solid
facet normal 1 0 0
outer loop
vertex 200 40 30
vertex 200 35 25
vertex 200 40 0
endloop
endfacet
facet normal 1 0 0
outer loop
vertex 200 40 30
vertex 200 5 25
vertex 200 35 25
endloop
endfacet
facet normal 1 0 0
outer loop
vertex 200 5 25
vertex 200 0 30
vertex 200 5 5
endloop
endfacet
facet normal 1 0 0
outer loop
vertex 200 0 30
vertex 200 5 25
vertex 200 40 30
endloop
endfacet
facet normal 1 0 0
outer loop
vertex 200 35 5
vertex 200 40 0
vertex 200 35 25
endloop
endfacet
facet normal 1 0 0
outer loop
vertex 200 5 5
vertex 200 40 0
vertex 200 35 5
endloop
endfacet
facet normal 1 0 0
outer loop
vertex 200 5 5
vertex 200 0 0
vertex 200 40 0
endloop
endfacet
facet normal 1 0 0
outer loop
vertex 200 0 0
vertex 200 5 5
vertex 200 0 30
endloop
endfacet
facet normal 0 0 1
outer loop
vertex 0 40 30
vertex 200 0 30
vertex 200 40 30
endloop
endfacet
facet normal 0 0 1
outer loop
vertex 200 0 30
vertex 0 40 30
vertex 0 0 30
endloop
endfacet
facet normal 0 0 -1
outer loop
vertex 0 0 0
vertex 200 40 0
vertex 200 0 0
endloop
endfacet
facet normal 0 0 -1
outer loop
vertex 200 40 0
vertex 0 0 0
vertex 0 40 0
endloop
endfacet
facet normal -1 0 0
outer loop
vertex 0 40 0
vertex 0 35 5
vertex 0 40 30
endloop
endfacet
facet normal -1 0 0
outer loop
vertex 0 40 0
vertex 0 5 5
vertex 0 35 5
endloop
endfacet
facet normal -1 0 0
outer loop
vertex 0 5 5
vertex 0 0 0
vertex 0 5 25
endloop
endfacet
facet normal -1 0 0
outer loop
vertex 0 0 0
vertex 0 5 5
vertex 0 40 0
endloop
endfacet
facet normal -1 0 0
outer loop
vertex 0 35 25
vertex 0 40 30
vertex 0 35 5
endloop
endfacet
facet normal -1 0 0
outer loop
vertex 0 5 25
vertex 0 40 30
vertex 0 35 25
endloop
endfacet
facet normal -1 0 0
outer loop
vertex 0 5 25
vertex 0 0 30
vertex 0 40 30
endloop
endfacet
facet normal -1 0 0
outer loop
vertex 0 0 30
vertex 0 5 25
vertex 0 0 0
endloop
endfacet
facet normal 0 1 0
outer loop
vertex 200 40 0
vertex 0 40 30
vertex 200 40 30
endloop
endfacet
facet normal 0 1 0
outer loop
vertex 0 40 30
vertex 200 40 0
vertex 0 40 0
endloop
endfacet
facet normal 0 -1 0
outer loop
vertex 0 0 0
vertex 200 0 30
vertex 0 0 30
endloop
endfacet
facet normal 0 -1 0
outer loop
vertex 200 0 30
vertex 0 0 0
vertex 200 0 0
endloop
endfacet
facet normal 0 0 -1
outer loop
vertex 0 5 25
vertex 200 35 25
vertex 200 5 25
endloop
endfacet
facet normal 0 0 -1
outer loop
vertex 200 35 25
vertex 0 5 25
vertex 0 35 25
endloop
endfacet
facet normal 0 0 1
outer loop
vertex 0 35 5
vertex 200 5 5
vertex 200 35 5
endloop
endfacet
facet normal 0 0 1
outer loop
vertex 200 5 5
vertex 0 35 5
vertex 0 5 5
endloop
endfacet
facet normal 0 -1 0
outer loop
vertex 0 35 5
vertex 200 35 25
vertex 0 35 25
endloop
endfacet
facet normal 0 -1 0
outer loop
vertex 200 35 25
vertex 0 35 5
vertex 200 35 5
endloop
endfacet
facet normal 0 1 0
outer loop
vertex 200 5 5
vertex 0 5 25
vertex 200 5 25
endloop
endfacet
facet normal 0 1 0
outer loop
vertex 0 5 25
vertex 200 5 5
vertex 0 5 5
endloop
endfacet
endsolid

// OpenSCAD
$fn = 32;

// ----------------------------------------------------------------------
// Box beam: 200-250 mm hollow beam
// ----------------------------------------------------------------------

// --- parameters (mm) ---
beam_l = 200;             // beam length, X
beam_w = 40;              // beam width, Y
beam_h = 30;              // beam height, Z
wall = 5;                 // wall thickness

difference() {
  cube([beam_l, beam_w, beam_h]);
  translate([-1, wall, wall])
    cube([beam_l + 2, beam_w - 2 * wall, beam_h - 2 * wall]);
}
